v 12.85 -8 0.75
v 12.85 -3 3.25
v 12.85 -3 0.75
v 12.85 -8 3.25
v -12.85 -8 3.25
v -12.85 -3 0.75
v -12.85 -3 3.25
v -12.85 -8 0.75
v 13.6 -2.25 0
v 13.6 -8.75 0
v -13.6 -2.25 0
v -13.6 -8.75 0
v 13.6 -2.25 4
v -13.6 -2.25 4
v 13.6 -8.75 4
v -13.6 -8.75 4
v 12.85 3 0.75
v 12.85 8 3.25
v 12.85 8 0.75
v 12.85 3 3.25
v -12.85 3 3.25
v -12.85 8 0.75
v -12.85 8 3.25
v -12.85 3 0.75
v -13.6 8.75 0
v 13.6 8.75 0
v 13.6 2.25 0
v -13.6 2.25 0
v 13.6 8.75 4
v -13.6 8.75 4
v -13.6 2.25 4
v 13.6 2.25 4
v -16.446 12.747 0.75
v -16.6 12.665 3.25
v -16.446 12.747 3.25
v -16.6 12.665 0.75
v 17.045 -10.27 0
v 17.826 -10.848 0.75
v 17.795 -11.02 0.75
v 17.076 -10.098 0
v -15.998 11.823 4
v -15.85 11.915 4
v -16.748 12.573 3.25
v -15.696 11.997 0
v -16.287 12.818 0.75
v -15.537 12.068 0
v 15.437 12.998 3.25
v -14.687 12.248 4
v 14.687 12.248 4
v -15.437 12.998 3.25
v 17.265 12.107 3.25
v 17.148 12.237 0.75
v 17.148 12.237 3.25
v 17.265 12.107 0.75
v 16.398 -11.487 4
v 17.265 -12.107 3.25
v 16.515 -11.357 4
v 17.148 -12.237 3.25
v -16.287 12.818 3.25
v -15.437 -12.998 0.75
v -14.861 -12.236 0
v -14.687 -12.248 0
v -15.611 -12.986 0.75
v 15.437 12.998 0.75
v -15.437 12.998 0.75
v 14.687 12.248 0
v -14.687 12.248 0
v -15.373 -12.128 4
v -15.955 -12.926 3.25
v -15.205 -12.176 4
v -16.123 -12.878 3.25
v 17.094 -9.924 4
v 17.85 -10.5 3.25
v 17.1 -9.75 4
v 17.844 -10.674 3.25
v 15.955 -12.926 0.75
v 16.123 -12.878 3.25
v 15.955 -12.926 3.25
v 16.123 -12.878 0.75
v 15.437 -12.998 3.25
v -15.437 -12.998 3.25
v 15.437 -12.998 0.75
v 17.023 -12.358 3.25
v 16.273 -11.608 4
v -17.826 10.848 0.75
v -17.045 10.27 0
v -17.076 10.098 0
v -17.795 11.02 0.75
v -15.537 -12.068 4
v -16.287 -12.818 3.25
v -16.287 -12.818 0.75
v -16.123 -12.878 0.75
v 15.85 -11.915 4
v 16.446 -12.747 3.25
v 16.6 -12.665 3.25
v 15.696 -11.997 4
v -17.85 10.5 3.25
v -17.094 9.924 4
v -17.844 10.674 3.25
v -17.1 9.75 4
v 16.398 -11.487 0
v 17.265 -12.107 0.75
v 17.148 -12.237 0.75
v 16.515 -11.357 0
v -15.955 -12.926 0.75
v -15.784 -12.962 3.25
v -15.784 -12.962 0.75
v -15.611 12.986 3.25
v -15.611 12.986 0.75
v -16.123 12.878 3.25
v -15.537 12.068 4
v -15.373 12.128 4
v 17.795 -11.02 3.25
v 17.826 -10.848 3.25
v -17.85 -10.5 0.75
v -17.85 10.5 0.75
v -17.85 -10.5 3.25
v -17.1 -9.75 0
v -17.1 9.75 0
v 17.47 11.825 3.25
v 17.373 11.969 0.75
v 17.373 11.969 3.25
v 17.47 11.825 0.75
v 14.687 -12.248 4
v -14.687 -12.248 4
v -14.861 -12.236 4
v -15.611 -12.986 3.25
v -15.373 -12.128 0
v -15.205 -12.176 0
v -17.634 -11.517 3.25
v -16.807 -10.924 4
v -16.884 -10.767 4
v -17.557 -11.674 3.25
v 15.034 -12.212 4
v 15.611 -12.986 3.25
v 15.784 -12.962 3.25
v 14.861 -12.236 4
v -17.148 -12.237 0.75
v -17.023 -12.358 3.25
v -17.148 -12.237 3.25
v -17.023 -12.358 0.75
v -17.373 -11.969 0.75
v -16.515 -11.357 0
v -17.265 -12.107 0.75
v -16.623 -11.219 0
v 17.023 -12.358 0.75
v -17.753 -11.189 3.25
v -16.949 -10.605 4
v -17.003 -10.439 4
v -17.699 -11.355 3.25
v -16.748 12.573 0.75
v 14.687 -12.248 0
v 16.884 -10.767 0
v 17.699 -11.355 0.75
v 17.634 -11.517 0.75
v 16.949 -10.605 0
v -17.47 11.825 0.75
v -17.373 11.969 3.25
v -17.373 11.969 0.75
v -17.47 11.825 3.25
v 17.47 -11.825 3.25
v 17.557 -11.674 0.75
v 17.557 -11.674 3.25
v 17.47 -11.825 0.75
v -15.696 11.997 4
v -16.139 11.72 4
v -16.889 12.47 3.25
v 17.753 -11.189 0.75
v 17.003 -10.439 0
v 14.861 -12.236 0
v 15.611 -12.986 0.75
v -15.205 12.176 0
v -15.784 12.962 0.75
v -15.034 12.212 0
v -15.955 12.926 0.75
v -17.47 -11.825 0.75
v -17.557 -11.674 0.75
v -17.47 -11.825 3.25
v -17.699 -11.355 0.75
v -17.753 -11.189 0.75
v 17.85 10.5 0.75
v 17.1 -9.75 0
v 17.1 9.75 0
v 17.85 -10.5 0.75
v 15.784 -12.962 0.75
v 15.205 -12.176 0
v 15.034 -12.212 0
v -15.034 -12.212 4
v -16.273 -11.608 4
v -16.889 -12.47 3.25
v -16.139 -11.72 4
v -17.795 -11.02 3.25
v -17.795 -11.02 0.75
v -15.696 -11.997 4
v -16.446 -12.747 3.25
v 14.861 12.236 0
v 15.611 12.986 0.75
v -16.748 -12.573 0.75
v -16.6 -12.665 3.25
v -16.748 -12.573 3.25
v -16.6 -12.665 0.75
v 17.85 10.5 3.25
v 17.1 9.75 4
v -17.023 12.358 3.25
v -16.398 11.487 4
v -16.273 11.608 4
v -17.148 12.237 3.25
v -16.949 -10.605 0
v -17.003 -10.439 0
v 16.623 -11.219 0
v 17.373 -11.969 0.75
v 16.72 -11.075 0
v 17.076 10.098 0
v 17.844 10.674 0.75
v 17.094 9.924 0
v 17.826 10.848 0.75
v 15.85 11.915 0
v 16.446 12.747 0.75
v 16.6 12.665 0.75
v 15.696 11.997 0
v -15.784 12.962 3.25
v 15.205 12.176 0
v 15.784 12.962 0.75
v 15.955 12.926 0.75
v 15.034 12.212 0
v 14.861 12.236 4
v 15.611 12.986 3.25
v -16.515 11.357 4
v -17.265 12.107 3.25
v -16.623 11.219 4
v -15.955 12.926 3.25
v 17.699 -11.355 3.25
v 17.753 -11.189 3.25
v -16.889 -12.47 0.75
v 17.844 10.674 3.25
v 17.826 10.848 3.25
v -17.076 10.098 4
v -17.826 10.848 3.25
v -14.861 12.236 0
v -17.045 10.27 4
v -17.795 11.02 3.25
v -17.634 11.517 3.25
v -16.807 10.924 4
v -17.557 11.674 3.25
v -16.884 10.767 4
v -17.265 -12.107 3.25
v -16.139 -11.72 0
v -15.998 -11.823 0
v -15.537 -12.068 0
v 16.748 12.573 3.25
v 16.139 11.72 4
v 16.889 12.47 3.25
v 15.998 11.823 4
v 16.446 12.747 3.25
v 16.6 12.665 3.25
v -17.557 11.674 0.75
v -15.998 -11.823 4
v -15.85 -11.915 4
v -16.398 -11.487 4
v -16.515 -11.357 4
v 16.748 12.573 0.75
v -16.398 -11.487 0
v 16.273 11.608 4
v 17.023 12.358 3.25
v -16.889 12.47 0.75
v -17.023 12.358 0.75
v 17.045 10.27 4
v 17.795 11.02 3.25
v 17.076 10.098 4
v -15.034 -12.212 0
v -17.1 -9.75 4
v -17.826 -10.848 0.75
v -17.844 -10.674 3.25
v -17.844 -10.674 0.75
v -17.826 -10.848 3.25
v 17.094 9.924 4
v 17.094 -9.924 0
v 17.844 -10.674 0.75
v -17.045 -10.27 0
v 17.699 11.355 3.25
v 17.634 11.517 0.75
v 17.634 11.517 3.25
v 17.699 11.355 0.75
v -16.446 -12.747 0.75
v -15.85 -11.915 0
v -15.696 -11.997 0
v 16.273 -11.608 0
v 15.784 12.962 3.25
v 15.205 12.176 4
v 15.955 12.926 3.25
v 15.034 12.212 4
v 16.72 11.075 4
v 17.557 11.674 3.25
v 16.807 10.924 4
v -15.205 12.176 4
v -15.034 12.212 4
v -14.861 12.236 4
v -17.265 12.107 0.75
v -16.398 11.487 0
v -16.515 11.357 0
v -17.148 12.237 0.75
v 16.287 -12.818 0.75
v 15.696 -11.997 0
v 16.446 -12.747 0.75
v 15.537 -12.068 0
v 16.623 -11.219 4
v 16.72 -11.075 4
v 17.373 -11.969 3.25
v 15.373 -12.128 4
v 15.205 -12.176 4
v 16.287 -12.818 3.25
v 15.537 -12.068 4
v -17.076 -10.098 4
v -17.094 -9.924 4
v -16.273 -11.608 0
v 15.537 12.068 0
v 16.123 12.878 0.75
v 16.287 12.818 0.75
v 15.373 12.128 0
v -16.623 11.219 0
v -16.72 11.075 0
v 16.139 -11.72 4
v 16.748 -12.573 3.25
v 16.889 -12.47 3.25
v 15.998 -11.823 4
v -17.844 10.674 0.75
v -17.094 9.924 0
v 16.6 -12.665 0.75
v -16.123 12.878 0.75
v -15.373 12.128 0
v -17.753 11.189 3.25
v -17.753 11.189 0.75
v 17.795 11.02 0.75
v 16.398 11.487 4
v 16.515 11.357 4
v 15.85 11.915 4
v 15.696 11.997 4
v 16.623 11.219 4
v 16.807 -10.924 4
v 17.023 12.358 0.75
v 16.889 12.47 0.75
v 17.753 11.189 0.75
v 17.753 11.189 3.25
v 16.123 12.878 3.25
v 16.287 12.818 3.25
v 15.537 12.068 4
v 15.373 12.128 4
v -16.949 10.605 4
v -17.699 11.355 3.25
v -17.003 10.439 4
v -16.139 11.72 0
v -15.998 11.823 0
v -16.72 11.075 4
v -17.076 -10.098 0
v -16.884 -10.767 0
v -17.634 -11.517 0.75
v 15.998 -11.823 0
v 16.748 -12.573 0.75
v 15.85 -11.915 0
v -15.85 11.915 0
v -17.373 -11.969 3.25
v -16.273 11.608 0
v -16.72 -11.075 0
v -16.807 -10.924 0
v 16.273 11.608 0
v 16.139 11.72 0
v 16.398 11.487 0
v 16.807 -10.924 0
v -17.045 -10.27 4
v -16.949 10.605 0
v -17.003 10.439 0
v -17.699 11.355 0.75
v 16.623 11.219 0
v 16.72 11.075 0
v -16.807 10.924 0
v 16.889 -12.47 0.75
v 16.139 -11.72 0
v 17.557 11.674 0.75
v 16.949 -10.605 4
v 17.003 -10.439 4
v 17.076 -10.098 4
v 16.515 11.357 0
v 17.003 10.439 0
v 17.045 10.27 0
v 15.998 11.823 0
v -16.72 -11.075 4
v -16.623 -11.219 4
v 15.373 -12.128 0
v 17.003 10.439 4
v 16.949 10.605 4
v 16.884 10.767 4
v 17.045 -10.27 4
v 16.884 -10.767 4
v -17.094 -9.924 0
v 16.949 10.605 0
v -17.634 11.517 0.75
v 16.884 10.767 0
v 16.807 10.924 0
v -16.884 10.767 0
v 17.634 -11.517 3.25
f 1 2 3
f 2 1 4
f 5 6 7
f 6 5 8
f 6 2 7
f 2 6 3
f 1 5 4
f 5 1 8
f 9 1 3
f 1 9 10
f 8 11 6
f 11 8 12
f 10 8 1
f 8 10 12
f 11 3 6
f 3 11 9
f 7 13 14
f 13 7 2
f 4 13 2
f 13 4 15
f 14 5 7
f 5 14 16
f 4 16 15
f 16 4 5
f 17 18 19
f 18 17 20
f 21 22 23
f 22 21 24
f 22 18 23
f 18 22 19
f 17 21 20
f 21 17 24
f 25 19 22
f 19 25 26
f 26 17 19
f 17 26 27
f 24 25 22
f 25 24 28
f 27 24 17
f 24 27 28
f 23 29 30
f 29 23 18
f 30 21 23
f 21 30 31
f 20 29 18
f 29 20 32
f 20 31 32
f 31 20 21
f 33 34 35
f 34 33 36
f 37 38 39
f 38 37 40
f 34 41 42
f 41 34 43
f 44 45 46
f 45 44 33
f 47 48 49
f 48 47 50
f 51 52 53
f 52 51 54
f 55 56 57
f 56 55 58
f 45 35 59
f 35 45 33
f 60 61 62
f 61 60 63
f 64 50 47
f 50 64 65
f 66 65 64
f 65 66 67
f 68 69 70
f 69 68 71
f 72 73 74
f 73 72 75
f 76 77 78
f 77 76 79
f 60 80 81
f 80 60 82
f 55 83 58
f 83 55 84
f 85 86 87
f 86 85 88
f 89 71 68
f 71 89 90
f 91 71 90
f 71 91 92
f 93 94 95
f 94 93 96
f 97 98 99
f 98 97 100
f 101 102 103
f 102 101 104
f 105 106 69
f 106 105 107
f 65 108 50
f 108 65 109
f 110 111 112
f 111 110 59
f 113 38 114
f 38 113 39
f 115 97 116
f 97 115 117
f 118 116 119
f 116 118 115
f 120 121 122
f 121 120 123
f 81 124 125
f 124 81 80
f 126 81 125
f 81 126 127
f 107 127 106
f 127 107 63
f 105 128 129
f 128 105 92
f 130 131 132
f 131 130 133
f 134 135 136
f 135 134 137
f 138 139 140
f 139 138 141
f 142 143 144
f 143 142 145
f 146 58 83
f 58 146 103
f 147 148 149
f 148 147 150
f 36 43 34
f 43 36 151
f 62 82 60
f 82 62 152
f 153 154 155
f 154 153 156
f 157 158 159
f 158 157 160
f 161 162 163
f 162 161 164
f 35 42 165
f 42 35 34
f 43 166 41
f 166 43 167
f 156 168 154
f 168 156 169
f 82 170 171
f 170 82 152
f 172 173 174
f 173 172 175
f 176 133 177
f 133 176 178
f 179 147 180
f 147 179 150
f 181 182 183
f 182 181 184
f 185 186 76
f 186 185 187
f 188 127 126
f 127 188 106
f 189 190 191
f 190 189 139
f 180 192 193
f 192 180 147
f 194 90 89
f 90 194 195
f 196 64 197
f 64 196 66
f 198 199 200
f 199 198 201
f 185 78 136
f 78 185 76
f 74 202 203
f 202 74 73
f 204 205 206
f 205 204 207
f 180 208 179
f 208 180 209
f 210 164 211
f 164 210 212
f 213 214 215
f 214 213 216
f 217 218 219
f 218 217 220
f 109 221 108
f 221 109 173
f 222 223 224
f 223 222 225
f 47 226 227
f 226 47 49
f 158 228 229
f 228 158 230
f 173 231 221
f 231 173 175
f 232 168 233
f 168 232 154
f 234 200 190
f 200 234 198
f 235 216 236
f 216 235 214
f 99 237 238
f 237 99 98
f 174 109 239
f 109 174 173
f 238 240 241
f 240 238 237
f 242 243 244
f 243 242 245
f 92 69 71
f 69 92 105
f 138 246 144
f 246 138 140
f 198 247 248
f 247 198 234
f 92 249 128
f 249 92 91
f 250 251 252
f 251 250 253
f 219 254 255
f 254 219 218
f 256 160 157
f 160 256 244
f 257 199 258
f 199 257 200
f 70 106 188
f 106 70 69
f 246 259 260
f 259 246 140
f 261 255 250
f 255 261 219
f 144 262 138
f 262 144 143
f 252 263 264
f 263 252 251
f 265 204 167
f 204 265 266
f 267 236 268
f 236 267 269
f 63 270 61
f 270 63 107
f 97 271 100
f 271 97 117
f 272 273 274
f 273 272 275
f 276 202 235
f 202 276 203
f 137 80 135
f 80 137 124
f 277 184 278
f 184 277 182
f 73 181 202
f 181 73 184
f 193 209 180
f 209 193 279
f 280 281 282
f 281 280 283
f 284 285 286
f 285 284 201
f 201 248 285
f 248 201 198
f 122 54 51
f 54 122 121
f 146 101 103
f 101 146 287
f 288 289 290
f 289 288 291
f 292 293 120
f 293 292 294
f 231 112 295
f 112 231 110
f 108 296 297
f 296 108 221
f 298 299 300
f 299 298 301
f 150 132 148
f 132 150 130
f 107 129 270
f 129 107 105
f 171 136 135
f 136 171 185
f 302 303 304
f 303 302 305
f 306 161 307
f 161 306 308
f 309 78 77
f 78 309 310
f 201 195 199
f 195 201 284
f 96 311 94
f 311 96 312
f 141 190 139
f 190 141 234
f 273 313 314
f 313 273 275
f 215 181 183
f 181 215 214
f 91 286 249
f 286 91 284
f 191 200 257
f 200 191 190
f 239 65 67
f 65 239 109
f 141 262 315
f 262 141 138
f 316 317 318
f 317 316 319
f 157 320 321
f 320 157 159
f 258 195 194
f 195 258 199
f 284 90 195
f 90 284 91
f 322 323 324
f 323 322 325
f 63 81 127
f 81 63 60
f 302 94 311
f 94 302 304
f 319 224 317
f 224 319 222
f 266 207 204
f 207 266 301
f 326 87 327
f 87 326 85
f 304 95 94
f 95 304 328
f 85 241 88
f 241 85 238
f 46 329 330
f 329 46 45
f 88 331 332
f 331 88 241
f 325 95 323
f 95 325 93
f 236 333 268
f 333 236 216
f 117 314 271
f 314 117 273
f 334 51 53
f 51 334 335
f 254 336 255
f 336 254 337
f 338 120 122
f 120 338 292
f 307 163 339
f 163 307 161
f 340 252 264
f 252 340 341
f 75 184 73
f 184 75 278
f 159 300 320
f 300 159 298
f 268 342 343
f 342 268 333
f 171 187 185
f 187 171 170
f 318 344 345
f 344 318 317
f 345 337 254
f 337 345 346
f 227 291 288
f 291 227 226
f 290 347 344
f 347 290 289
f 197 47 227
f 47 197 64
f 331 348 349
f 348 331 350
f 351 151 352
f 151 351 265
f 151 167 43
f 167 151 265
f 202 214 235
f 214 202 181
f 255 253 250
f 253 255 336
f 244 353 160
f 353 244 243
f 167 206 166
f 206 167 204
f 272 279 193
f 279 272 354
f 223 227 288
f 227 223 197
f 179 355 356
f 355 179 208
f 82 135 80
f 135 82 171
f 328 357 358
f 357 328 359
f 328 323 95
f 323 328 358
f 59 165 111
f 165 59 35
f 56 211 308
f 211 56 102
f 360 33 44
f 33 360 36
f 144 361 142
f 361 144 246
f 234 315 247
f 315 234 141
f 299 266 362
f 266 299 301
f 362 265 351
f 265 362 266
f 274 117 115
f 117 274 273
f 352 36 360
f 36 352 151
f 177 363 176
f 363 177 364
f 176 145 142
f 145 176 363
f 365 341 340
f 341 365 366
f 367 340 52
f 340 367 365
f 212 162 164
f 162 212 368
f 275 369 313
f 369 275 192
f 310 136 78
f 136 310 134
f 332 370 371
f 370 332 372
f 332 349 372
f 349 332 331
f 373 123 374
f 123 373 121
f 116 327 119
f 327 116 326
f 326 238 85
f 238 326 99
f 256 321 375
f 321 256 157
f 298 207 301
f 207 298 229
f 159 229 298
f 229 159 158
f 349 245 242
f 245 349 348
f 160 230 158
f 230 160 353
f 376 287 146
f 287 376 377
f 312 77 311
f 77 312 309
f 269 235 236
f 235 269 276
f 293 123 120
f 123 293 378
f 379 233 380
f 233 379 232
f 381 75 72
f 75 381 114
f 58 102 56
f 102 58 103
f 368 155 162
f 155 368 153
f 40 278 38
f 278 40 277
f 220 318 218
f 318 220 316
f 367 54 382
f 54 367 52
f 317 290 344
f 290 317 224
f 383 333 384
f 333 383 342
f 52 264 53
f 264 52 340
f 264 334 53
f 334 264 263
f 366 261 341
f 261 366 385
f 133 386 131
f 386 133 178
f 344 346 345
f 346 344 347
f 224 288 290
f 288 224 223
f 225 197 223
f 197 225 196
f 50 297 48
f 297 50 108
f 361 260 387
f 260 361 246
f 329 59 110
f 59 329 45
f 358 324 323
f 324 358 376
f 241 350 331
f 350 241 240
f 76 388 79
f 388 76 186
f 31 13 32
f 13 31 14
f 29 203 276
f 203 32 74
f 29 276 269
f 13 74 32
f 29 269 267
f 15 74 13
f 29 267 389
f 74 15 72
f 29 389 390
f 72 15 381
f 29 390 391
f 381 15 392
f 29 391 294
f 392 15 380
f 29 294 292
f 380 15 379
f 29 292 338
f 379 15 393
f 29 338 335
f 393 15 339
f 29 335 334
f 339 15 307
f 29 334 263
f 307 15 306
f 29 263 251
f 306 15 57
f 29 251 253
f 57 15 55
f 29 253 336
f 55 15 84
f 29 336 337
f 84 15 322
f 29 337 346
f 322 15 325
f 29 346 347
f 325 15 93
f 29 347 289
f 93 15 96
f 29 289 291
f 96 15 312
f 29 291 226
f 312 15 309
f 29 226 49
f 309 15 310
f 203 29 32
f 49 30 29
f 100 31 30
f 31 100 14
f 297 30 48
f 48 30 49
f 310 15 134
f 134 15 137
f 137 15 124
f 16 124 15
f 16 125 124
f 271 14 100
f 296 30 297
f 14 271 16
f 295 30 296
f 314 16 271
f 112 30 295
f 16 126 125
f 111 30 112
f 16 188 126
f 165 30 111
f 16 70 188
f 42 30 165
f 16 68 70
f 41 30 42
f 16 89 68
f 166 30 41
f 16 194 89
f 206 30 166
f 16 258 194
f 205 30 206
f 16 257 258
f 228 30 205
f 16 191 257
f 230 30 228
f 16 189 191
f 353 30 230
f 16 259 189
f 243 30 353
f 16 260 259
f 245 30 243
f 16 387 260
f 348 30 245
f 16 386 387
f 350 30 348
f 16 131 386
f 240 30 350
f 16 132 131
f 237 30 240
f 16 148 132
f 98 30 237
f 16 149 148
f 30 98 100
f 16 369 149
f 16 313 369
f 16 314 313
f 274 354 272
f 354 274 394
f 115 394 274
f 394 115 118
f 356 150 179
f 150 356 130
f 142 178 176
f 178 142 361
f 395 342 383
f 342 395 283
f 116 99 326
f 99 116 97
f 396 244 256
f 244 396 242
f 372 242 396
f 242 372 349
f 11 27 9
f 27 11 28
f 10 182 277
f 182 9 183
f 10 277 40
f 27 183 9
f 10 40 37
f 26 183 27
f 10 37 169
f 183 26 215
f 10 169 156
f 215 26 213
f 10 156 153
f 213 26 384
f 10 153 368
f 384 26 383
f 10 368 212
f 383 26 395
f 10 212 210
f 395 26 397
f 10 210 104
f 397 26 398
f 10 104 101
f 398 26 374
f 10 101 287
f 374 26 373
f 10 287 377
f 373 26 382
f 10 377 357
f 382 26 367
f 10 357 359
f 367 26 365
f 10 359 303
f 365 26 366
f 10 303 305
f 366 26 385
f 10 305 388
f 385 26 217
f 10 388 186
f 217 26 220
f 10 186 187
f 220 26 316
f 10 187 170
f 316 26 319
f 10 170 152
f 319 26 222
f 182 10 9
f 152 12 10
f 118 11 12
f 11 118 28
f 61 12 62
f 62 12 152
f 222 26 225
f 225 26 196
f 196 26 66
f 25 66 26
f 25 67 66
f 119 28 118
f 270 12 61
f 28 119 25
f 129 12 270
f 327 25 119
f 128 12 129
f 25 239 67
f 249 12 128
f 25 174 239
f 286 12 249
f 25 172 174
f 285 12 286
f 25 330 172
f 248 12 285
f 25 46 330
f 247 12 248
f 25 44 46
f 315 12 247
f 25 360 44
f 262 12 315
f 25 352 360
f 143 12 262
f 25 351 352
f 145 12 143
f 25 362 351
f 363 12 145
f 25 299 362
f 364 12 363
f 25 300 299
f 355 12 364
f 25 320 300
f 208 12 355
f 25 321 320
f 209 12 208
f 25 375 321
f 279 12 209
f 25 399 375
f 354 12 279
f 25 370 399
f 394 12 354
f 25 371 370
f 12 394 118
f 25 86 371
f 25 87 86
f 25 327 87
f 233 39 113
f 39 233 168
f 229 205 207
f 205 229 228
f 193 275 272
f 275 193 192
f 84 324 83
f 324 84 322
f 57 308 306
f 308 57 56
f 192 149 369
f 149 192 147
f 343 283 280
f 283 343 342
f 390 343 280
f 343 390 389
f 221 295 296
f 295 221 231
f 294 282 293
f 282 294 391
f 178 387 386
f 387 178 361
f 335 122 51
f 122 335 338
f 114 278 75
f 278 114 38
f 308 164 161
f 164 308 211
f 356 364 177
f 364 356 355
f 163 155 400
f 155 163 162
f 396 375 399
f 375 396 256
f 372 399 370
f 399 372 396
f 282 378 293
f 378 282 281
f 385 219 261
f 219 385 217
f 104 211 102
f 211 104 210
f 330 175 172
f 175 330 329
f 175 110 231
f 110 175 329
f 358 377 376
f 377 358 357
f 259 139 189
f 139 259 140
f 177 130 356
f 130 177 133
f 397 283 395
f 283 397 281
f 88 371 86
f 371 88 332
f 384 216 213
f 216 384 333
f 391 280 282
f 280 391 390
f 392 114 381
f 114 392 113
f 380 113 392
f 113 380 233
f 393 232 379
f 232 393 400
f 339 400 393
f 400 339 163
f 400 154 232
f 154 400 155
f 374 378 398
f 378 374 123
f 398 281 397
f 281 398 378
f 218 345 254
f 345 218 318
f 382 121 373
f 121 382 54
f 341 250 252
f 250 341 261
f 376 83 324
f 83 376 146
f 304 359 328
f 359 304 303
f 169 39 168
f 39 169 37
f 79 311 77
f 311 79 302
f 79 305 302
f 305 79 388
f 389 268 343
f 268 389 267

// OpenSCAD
// License: Public Domain

//=== Flat Tri Glide ===//
/*
//width of the webbing opening (1in = 25.4 mm)
_1_webbingOpeningWidth = 38;
// width of the gap for the webbing
_2_webbingGapWidth = 6;
// width of the side edges
_3_sideEdgeWidth = 5;
// width of the main edges
_4_mainEdgeWidth = 7;
// width of the center beam
_5_centerWidth = 10;
// overall thickness of the tri glide
_6_overallHeight = 4; //3
// percent corner rounding
_7_cornerRoundingPercent = 50; // [1:100]
// how much to break off the edges (in mm)
_8_cornerBreakage = 0.75;
*/

// 1" Heavy Duty
_1_webbingOpeningWidth = 25.7;
_2_webbingGapWidth = 5;
_3_sideEdgeWidth = 5;
_4_mainEdgeWidth = 5;
_5_centerWidth = 6;
_6_overallHeight = 4; //3
_7_cornerRoundingPercent = 50; // [1:100]
_8_cornerBreakage = 0.75;


module makeBody(xsize, ysize, height, radius) {
	translate([0,0,height/2]) {
		minkowski() {
			cube(size=[xsize-2*radius,ysize-2*radius, height/2], center = true);
			cylinder(r=radius, h=height/2, center=true);
		}
	}
}

module makeCuts(width, gap, thickness, height,b) {
	offset = (thickness+gap)/2;
	for (y = [-offset, offset]) {
		translate([0, y, 0]) {

			translate([0, 0, height/2])
				cube(size=[width, gap, height*2], center=true);
			translate([0, 0, 0])
				makeCutEnd(width, gap, thickness, height,b);
			translate([0, 0, height]) scale([1,1,-1])
				makeCutEnd(width, gap, thickness, height,b);
		}
	}
}

module makeCutEnd(width, gap, thickness, height,b)
{
	hull(){
		translate([0,0,+b/2])
			cube(size=[width, gap, b], center=true);
		translate([0,0,-b/2])
			cube(size=[width+2*b, gap+2*b, b], center=true);			
	}
}

module makeTriGlide(width, gap, edgeThicknessSide, edgeThicknessMain, centerThickness, height, rounding, b, $fn=90) {
	xsize = width + edgeThicknessSide * 2;
	ysize = centerThickness + edgeThicknessMain * 2 + gap * 2;
	radius = max(edgeThicknessSide,edgeThicknessMain)*(rounding/100);
	difference() {
        hull()
        {
		  makeBody(xsize-2*b, ysize-2*b, height, radius);
          translate([0,0,b])
		  makeBody(xsize, ysize, height-2*b, radius);
        }
		makeCuts(width, gap, centerThickness, height,b);
	}
}


makeTriGlide
  ( _1_webbingOpeningWidth
  , _2_webbingGapWidth
  , _3_sideEdgeWidth
  , _4_mainEdgeWidth
  , _5_centerWidth
  , _6_overallHeight
  , _7_cornerRoundingPercent
  ,_8_cornerBreakage
  );
